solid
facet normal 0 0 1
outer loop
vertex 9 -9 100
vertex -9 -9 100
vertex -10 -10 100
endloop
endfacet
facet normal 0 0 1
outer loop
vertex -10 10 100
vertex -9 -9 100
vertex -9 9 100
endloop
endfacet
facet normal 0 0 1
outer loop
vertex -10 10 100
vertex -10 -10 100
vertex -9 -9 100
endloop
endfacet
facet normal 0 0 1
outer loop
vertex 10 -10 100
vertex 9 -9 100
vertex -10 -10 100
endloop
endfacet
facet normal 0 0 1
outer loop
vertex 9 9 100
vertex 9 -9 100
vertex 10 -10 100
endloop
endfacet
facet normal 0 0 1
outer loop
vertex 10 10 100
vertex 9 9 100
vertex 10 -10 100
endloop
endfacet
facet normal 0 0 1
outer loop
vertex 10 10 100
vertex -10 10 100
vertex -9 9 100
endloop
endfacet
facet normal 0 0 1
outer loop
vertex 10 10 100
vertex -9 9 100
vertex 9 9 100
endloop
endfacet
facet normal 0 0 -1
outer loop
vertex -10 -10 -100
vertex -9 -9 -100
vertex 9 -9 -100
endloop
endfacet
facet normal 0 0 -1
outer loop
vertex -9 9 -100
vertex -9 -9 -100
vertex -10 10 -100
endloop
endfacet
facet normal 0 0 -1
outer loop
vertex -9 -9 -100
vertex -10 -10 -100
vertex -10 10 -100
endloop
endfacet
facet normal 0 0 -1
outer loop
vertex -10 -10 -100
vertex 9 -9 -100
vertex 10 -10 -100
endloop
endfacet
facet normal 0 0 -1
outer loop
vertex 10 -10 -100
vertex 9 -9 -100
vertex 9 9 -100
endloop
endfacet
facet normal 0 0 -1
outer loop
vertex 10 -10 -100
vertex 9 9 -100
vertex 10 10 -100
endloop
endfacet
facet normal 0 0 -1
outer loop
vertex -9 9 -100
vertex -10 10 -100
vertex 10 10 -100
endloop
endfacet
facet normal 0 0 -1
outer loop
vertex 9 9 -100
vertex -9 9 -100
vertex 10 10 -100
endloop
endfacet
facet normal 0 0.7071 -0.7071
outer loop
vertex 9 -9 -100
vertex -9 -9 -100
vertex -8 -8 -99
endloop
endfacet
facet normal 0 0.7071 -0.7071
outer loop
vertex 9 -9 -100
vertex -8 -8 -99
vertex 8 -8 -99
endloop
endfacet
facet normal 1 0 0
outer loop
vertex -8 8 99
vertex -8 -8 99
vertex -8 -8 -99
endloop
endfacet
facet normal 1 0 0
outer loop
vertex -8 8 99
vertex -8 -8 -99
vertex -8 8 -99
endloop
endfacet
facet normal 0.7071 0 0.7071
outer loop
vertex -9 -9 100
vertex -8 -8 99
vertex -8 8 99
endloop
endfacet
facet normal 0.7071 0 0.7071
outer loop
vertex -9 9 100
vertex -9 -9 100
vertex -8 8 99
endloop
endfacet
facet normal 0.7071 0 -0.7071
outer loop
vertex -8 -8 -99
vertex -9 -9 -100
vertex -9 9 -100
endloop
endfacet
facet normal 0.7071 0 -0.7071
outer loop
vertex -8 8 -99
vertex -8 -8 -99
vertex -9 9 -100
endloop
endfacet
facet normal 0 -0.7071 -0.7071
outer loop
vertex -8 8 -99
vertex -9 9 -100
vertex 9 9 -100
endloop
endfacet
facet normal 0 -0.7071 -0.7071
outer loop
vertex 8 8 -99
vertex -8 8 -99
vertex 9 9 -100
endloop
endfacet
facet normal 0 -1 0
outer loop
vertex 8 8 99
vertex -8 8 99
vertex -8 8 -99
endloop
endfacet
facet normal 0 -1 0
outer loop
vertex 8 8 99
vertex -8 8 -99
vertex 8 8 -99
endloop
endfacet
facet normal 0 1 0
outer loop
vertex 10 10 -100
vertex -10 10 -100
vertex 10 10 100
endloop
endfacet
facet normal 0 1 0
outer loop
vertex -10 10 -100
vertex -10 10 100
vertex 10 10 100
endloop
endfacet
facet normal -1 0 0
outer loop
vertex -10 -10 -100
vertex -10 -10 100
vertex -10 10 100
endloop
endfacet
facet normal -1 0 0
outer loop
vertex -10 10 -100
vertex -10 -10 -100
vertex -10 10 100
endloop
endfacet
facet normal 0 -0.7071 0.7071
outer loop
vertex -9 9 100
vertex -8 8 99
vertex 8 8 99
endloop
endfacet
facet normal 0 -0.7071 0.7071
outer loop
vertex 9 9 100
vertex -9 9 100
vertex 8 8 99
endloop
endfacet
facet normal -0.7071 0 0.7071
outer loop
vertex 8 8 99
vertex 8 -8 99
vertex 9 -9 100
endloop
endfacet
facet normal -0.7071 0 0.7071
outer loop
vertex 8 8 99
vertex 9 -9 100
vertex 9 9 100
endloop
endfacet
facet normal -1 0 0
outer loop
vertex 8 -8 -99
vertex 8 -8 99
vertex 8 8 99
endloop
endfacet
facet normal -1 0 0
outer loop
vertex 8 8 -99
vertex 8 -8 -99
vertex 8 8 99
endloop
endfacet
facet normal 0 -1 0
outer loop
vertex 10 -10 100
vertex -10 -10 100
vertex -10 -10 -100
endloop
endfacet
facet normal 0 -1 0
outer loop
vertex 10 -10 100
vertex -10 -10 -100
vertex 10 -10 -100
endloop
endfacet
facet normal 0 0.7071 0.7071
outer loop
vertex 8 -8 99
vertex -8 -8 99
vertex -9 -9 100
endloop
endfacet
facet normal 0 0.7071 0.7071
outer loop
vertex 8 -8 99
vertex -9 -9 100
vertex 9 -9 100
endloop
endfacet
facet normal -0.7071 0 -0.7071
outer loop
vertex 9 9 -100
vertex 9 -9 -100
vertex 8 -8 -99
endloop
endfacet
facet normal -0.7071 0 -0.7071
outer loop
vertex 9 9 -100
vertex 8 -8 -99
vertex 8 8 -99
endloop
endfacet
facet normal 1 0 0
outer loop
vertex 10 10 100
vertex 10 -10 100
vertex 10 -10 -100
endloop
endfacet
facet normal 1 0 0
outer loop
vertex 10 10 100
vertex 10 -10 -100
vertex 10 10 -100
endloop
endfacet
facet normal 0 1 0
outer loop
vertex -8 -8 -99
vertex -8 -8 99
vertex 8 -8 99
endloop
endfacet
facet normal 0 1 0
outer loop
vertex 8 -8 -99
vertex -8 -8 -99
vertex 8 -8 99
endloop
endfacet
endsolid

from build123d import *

# Parameters (mm, degrees)
F0_W     = 20
F0_H     = 20
F0_W_2   = 16
F0_H_2   = 16
F1_DEPTH = 100
F2_SIZE  = 1


with BuildPart() as f1:
    # F0 (on Top) → F1 (new body, symmetric)
    with BuildSketch(Plane.XY):
        Rectangle(F0_W, F0_H)
        Rectangle(F0_W_2, F0_H_2, mode=Mode.SUBTRACT)
    extrude(amount=F1_DEPTH, both=True)

    # F2
    f2_edges = [f1.edges().sort_by_distance(p)[0] for p in [
        (0, 8, 100),
        (-8, 0, 100),
        (8, 0, 100),
        (0, -8, 100),
        (0, 8, -100),
        (8, 0, -100),
        (0, -8, -100),
        (-8, 0, -100),
    ]]
    chamfer(f2_edges, length=F2_SIZE)


solid = f1.part
